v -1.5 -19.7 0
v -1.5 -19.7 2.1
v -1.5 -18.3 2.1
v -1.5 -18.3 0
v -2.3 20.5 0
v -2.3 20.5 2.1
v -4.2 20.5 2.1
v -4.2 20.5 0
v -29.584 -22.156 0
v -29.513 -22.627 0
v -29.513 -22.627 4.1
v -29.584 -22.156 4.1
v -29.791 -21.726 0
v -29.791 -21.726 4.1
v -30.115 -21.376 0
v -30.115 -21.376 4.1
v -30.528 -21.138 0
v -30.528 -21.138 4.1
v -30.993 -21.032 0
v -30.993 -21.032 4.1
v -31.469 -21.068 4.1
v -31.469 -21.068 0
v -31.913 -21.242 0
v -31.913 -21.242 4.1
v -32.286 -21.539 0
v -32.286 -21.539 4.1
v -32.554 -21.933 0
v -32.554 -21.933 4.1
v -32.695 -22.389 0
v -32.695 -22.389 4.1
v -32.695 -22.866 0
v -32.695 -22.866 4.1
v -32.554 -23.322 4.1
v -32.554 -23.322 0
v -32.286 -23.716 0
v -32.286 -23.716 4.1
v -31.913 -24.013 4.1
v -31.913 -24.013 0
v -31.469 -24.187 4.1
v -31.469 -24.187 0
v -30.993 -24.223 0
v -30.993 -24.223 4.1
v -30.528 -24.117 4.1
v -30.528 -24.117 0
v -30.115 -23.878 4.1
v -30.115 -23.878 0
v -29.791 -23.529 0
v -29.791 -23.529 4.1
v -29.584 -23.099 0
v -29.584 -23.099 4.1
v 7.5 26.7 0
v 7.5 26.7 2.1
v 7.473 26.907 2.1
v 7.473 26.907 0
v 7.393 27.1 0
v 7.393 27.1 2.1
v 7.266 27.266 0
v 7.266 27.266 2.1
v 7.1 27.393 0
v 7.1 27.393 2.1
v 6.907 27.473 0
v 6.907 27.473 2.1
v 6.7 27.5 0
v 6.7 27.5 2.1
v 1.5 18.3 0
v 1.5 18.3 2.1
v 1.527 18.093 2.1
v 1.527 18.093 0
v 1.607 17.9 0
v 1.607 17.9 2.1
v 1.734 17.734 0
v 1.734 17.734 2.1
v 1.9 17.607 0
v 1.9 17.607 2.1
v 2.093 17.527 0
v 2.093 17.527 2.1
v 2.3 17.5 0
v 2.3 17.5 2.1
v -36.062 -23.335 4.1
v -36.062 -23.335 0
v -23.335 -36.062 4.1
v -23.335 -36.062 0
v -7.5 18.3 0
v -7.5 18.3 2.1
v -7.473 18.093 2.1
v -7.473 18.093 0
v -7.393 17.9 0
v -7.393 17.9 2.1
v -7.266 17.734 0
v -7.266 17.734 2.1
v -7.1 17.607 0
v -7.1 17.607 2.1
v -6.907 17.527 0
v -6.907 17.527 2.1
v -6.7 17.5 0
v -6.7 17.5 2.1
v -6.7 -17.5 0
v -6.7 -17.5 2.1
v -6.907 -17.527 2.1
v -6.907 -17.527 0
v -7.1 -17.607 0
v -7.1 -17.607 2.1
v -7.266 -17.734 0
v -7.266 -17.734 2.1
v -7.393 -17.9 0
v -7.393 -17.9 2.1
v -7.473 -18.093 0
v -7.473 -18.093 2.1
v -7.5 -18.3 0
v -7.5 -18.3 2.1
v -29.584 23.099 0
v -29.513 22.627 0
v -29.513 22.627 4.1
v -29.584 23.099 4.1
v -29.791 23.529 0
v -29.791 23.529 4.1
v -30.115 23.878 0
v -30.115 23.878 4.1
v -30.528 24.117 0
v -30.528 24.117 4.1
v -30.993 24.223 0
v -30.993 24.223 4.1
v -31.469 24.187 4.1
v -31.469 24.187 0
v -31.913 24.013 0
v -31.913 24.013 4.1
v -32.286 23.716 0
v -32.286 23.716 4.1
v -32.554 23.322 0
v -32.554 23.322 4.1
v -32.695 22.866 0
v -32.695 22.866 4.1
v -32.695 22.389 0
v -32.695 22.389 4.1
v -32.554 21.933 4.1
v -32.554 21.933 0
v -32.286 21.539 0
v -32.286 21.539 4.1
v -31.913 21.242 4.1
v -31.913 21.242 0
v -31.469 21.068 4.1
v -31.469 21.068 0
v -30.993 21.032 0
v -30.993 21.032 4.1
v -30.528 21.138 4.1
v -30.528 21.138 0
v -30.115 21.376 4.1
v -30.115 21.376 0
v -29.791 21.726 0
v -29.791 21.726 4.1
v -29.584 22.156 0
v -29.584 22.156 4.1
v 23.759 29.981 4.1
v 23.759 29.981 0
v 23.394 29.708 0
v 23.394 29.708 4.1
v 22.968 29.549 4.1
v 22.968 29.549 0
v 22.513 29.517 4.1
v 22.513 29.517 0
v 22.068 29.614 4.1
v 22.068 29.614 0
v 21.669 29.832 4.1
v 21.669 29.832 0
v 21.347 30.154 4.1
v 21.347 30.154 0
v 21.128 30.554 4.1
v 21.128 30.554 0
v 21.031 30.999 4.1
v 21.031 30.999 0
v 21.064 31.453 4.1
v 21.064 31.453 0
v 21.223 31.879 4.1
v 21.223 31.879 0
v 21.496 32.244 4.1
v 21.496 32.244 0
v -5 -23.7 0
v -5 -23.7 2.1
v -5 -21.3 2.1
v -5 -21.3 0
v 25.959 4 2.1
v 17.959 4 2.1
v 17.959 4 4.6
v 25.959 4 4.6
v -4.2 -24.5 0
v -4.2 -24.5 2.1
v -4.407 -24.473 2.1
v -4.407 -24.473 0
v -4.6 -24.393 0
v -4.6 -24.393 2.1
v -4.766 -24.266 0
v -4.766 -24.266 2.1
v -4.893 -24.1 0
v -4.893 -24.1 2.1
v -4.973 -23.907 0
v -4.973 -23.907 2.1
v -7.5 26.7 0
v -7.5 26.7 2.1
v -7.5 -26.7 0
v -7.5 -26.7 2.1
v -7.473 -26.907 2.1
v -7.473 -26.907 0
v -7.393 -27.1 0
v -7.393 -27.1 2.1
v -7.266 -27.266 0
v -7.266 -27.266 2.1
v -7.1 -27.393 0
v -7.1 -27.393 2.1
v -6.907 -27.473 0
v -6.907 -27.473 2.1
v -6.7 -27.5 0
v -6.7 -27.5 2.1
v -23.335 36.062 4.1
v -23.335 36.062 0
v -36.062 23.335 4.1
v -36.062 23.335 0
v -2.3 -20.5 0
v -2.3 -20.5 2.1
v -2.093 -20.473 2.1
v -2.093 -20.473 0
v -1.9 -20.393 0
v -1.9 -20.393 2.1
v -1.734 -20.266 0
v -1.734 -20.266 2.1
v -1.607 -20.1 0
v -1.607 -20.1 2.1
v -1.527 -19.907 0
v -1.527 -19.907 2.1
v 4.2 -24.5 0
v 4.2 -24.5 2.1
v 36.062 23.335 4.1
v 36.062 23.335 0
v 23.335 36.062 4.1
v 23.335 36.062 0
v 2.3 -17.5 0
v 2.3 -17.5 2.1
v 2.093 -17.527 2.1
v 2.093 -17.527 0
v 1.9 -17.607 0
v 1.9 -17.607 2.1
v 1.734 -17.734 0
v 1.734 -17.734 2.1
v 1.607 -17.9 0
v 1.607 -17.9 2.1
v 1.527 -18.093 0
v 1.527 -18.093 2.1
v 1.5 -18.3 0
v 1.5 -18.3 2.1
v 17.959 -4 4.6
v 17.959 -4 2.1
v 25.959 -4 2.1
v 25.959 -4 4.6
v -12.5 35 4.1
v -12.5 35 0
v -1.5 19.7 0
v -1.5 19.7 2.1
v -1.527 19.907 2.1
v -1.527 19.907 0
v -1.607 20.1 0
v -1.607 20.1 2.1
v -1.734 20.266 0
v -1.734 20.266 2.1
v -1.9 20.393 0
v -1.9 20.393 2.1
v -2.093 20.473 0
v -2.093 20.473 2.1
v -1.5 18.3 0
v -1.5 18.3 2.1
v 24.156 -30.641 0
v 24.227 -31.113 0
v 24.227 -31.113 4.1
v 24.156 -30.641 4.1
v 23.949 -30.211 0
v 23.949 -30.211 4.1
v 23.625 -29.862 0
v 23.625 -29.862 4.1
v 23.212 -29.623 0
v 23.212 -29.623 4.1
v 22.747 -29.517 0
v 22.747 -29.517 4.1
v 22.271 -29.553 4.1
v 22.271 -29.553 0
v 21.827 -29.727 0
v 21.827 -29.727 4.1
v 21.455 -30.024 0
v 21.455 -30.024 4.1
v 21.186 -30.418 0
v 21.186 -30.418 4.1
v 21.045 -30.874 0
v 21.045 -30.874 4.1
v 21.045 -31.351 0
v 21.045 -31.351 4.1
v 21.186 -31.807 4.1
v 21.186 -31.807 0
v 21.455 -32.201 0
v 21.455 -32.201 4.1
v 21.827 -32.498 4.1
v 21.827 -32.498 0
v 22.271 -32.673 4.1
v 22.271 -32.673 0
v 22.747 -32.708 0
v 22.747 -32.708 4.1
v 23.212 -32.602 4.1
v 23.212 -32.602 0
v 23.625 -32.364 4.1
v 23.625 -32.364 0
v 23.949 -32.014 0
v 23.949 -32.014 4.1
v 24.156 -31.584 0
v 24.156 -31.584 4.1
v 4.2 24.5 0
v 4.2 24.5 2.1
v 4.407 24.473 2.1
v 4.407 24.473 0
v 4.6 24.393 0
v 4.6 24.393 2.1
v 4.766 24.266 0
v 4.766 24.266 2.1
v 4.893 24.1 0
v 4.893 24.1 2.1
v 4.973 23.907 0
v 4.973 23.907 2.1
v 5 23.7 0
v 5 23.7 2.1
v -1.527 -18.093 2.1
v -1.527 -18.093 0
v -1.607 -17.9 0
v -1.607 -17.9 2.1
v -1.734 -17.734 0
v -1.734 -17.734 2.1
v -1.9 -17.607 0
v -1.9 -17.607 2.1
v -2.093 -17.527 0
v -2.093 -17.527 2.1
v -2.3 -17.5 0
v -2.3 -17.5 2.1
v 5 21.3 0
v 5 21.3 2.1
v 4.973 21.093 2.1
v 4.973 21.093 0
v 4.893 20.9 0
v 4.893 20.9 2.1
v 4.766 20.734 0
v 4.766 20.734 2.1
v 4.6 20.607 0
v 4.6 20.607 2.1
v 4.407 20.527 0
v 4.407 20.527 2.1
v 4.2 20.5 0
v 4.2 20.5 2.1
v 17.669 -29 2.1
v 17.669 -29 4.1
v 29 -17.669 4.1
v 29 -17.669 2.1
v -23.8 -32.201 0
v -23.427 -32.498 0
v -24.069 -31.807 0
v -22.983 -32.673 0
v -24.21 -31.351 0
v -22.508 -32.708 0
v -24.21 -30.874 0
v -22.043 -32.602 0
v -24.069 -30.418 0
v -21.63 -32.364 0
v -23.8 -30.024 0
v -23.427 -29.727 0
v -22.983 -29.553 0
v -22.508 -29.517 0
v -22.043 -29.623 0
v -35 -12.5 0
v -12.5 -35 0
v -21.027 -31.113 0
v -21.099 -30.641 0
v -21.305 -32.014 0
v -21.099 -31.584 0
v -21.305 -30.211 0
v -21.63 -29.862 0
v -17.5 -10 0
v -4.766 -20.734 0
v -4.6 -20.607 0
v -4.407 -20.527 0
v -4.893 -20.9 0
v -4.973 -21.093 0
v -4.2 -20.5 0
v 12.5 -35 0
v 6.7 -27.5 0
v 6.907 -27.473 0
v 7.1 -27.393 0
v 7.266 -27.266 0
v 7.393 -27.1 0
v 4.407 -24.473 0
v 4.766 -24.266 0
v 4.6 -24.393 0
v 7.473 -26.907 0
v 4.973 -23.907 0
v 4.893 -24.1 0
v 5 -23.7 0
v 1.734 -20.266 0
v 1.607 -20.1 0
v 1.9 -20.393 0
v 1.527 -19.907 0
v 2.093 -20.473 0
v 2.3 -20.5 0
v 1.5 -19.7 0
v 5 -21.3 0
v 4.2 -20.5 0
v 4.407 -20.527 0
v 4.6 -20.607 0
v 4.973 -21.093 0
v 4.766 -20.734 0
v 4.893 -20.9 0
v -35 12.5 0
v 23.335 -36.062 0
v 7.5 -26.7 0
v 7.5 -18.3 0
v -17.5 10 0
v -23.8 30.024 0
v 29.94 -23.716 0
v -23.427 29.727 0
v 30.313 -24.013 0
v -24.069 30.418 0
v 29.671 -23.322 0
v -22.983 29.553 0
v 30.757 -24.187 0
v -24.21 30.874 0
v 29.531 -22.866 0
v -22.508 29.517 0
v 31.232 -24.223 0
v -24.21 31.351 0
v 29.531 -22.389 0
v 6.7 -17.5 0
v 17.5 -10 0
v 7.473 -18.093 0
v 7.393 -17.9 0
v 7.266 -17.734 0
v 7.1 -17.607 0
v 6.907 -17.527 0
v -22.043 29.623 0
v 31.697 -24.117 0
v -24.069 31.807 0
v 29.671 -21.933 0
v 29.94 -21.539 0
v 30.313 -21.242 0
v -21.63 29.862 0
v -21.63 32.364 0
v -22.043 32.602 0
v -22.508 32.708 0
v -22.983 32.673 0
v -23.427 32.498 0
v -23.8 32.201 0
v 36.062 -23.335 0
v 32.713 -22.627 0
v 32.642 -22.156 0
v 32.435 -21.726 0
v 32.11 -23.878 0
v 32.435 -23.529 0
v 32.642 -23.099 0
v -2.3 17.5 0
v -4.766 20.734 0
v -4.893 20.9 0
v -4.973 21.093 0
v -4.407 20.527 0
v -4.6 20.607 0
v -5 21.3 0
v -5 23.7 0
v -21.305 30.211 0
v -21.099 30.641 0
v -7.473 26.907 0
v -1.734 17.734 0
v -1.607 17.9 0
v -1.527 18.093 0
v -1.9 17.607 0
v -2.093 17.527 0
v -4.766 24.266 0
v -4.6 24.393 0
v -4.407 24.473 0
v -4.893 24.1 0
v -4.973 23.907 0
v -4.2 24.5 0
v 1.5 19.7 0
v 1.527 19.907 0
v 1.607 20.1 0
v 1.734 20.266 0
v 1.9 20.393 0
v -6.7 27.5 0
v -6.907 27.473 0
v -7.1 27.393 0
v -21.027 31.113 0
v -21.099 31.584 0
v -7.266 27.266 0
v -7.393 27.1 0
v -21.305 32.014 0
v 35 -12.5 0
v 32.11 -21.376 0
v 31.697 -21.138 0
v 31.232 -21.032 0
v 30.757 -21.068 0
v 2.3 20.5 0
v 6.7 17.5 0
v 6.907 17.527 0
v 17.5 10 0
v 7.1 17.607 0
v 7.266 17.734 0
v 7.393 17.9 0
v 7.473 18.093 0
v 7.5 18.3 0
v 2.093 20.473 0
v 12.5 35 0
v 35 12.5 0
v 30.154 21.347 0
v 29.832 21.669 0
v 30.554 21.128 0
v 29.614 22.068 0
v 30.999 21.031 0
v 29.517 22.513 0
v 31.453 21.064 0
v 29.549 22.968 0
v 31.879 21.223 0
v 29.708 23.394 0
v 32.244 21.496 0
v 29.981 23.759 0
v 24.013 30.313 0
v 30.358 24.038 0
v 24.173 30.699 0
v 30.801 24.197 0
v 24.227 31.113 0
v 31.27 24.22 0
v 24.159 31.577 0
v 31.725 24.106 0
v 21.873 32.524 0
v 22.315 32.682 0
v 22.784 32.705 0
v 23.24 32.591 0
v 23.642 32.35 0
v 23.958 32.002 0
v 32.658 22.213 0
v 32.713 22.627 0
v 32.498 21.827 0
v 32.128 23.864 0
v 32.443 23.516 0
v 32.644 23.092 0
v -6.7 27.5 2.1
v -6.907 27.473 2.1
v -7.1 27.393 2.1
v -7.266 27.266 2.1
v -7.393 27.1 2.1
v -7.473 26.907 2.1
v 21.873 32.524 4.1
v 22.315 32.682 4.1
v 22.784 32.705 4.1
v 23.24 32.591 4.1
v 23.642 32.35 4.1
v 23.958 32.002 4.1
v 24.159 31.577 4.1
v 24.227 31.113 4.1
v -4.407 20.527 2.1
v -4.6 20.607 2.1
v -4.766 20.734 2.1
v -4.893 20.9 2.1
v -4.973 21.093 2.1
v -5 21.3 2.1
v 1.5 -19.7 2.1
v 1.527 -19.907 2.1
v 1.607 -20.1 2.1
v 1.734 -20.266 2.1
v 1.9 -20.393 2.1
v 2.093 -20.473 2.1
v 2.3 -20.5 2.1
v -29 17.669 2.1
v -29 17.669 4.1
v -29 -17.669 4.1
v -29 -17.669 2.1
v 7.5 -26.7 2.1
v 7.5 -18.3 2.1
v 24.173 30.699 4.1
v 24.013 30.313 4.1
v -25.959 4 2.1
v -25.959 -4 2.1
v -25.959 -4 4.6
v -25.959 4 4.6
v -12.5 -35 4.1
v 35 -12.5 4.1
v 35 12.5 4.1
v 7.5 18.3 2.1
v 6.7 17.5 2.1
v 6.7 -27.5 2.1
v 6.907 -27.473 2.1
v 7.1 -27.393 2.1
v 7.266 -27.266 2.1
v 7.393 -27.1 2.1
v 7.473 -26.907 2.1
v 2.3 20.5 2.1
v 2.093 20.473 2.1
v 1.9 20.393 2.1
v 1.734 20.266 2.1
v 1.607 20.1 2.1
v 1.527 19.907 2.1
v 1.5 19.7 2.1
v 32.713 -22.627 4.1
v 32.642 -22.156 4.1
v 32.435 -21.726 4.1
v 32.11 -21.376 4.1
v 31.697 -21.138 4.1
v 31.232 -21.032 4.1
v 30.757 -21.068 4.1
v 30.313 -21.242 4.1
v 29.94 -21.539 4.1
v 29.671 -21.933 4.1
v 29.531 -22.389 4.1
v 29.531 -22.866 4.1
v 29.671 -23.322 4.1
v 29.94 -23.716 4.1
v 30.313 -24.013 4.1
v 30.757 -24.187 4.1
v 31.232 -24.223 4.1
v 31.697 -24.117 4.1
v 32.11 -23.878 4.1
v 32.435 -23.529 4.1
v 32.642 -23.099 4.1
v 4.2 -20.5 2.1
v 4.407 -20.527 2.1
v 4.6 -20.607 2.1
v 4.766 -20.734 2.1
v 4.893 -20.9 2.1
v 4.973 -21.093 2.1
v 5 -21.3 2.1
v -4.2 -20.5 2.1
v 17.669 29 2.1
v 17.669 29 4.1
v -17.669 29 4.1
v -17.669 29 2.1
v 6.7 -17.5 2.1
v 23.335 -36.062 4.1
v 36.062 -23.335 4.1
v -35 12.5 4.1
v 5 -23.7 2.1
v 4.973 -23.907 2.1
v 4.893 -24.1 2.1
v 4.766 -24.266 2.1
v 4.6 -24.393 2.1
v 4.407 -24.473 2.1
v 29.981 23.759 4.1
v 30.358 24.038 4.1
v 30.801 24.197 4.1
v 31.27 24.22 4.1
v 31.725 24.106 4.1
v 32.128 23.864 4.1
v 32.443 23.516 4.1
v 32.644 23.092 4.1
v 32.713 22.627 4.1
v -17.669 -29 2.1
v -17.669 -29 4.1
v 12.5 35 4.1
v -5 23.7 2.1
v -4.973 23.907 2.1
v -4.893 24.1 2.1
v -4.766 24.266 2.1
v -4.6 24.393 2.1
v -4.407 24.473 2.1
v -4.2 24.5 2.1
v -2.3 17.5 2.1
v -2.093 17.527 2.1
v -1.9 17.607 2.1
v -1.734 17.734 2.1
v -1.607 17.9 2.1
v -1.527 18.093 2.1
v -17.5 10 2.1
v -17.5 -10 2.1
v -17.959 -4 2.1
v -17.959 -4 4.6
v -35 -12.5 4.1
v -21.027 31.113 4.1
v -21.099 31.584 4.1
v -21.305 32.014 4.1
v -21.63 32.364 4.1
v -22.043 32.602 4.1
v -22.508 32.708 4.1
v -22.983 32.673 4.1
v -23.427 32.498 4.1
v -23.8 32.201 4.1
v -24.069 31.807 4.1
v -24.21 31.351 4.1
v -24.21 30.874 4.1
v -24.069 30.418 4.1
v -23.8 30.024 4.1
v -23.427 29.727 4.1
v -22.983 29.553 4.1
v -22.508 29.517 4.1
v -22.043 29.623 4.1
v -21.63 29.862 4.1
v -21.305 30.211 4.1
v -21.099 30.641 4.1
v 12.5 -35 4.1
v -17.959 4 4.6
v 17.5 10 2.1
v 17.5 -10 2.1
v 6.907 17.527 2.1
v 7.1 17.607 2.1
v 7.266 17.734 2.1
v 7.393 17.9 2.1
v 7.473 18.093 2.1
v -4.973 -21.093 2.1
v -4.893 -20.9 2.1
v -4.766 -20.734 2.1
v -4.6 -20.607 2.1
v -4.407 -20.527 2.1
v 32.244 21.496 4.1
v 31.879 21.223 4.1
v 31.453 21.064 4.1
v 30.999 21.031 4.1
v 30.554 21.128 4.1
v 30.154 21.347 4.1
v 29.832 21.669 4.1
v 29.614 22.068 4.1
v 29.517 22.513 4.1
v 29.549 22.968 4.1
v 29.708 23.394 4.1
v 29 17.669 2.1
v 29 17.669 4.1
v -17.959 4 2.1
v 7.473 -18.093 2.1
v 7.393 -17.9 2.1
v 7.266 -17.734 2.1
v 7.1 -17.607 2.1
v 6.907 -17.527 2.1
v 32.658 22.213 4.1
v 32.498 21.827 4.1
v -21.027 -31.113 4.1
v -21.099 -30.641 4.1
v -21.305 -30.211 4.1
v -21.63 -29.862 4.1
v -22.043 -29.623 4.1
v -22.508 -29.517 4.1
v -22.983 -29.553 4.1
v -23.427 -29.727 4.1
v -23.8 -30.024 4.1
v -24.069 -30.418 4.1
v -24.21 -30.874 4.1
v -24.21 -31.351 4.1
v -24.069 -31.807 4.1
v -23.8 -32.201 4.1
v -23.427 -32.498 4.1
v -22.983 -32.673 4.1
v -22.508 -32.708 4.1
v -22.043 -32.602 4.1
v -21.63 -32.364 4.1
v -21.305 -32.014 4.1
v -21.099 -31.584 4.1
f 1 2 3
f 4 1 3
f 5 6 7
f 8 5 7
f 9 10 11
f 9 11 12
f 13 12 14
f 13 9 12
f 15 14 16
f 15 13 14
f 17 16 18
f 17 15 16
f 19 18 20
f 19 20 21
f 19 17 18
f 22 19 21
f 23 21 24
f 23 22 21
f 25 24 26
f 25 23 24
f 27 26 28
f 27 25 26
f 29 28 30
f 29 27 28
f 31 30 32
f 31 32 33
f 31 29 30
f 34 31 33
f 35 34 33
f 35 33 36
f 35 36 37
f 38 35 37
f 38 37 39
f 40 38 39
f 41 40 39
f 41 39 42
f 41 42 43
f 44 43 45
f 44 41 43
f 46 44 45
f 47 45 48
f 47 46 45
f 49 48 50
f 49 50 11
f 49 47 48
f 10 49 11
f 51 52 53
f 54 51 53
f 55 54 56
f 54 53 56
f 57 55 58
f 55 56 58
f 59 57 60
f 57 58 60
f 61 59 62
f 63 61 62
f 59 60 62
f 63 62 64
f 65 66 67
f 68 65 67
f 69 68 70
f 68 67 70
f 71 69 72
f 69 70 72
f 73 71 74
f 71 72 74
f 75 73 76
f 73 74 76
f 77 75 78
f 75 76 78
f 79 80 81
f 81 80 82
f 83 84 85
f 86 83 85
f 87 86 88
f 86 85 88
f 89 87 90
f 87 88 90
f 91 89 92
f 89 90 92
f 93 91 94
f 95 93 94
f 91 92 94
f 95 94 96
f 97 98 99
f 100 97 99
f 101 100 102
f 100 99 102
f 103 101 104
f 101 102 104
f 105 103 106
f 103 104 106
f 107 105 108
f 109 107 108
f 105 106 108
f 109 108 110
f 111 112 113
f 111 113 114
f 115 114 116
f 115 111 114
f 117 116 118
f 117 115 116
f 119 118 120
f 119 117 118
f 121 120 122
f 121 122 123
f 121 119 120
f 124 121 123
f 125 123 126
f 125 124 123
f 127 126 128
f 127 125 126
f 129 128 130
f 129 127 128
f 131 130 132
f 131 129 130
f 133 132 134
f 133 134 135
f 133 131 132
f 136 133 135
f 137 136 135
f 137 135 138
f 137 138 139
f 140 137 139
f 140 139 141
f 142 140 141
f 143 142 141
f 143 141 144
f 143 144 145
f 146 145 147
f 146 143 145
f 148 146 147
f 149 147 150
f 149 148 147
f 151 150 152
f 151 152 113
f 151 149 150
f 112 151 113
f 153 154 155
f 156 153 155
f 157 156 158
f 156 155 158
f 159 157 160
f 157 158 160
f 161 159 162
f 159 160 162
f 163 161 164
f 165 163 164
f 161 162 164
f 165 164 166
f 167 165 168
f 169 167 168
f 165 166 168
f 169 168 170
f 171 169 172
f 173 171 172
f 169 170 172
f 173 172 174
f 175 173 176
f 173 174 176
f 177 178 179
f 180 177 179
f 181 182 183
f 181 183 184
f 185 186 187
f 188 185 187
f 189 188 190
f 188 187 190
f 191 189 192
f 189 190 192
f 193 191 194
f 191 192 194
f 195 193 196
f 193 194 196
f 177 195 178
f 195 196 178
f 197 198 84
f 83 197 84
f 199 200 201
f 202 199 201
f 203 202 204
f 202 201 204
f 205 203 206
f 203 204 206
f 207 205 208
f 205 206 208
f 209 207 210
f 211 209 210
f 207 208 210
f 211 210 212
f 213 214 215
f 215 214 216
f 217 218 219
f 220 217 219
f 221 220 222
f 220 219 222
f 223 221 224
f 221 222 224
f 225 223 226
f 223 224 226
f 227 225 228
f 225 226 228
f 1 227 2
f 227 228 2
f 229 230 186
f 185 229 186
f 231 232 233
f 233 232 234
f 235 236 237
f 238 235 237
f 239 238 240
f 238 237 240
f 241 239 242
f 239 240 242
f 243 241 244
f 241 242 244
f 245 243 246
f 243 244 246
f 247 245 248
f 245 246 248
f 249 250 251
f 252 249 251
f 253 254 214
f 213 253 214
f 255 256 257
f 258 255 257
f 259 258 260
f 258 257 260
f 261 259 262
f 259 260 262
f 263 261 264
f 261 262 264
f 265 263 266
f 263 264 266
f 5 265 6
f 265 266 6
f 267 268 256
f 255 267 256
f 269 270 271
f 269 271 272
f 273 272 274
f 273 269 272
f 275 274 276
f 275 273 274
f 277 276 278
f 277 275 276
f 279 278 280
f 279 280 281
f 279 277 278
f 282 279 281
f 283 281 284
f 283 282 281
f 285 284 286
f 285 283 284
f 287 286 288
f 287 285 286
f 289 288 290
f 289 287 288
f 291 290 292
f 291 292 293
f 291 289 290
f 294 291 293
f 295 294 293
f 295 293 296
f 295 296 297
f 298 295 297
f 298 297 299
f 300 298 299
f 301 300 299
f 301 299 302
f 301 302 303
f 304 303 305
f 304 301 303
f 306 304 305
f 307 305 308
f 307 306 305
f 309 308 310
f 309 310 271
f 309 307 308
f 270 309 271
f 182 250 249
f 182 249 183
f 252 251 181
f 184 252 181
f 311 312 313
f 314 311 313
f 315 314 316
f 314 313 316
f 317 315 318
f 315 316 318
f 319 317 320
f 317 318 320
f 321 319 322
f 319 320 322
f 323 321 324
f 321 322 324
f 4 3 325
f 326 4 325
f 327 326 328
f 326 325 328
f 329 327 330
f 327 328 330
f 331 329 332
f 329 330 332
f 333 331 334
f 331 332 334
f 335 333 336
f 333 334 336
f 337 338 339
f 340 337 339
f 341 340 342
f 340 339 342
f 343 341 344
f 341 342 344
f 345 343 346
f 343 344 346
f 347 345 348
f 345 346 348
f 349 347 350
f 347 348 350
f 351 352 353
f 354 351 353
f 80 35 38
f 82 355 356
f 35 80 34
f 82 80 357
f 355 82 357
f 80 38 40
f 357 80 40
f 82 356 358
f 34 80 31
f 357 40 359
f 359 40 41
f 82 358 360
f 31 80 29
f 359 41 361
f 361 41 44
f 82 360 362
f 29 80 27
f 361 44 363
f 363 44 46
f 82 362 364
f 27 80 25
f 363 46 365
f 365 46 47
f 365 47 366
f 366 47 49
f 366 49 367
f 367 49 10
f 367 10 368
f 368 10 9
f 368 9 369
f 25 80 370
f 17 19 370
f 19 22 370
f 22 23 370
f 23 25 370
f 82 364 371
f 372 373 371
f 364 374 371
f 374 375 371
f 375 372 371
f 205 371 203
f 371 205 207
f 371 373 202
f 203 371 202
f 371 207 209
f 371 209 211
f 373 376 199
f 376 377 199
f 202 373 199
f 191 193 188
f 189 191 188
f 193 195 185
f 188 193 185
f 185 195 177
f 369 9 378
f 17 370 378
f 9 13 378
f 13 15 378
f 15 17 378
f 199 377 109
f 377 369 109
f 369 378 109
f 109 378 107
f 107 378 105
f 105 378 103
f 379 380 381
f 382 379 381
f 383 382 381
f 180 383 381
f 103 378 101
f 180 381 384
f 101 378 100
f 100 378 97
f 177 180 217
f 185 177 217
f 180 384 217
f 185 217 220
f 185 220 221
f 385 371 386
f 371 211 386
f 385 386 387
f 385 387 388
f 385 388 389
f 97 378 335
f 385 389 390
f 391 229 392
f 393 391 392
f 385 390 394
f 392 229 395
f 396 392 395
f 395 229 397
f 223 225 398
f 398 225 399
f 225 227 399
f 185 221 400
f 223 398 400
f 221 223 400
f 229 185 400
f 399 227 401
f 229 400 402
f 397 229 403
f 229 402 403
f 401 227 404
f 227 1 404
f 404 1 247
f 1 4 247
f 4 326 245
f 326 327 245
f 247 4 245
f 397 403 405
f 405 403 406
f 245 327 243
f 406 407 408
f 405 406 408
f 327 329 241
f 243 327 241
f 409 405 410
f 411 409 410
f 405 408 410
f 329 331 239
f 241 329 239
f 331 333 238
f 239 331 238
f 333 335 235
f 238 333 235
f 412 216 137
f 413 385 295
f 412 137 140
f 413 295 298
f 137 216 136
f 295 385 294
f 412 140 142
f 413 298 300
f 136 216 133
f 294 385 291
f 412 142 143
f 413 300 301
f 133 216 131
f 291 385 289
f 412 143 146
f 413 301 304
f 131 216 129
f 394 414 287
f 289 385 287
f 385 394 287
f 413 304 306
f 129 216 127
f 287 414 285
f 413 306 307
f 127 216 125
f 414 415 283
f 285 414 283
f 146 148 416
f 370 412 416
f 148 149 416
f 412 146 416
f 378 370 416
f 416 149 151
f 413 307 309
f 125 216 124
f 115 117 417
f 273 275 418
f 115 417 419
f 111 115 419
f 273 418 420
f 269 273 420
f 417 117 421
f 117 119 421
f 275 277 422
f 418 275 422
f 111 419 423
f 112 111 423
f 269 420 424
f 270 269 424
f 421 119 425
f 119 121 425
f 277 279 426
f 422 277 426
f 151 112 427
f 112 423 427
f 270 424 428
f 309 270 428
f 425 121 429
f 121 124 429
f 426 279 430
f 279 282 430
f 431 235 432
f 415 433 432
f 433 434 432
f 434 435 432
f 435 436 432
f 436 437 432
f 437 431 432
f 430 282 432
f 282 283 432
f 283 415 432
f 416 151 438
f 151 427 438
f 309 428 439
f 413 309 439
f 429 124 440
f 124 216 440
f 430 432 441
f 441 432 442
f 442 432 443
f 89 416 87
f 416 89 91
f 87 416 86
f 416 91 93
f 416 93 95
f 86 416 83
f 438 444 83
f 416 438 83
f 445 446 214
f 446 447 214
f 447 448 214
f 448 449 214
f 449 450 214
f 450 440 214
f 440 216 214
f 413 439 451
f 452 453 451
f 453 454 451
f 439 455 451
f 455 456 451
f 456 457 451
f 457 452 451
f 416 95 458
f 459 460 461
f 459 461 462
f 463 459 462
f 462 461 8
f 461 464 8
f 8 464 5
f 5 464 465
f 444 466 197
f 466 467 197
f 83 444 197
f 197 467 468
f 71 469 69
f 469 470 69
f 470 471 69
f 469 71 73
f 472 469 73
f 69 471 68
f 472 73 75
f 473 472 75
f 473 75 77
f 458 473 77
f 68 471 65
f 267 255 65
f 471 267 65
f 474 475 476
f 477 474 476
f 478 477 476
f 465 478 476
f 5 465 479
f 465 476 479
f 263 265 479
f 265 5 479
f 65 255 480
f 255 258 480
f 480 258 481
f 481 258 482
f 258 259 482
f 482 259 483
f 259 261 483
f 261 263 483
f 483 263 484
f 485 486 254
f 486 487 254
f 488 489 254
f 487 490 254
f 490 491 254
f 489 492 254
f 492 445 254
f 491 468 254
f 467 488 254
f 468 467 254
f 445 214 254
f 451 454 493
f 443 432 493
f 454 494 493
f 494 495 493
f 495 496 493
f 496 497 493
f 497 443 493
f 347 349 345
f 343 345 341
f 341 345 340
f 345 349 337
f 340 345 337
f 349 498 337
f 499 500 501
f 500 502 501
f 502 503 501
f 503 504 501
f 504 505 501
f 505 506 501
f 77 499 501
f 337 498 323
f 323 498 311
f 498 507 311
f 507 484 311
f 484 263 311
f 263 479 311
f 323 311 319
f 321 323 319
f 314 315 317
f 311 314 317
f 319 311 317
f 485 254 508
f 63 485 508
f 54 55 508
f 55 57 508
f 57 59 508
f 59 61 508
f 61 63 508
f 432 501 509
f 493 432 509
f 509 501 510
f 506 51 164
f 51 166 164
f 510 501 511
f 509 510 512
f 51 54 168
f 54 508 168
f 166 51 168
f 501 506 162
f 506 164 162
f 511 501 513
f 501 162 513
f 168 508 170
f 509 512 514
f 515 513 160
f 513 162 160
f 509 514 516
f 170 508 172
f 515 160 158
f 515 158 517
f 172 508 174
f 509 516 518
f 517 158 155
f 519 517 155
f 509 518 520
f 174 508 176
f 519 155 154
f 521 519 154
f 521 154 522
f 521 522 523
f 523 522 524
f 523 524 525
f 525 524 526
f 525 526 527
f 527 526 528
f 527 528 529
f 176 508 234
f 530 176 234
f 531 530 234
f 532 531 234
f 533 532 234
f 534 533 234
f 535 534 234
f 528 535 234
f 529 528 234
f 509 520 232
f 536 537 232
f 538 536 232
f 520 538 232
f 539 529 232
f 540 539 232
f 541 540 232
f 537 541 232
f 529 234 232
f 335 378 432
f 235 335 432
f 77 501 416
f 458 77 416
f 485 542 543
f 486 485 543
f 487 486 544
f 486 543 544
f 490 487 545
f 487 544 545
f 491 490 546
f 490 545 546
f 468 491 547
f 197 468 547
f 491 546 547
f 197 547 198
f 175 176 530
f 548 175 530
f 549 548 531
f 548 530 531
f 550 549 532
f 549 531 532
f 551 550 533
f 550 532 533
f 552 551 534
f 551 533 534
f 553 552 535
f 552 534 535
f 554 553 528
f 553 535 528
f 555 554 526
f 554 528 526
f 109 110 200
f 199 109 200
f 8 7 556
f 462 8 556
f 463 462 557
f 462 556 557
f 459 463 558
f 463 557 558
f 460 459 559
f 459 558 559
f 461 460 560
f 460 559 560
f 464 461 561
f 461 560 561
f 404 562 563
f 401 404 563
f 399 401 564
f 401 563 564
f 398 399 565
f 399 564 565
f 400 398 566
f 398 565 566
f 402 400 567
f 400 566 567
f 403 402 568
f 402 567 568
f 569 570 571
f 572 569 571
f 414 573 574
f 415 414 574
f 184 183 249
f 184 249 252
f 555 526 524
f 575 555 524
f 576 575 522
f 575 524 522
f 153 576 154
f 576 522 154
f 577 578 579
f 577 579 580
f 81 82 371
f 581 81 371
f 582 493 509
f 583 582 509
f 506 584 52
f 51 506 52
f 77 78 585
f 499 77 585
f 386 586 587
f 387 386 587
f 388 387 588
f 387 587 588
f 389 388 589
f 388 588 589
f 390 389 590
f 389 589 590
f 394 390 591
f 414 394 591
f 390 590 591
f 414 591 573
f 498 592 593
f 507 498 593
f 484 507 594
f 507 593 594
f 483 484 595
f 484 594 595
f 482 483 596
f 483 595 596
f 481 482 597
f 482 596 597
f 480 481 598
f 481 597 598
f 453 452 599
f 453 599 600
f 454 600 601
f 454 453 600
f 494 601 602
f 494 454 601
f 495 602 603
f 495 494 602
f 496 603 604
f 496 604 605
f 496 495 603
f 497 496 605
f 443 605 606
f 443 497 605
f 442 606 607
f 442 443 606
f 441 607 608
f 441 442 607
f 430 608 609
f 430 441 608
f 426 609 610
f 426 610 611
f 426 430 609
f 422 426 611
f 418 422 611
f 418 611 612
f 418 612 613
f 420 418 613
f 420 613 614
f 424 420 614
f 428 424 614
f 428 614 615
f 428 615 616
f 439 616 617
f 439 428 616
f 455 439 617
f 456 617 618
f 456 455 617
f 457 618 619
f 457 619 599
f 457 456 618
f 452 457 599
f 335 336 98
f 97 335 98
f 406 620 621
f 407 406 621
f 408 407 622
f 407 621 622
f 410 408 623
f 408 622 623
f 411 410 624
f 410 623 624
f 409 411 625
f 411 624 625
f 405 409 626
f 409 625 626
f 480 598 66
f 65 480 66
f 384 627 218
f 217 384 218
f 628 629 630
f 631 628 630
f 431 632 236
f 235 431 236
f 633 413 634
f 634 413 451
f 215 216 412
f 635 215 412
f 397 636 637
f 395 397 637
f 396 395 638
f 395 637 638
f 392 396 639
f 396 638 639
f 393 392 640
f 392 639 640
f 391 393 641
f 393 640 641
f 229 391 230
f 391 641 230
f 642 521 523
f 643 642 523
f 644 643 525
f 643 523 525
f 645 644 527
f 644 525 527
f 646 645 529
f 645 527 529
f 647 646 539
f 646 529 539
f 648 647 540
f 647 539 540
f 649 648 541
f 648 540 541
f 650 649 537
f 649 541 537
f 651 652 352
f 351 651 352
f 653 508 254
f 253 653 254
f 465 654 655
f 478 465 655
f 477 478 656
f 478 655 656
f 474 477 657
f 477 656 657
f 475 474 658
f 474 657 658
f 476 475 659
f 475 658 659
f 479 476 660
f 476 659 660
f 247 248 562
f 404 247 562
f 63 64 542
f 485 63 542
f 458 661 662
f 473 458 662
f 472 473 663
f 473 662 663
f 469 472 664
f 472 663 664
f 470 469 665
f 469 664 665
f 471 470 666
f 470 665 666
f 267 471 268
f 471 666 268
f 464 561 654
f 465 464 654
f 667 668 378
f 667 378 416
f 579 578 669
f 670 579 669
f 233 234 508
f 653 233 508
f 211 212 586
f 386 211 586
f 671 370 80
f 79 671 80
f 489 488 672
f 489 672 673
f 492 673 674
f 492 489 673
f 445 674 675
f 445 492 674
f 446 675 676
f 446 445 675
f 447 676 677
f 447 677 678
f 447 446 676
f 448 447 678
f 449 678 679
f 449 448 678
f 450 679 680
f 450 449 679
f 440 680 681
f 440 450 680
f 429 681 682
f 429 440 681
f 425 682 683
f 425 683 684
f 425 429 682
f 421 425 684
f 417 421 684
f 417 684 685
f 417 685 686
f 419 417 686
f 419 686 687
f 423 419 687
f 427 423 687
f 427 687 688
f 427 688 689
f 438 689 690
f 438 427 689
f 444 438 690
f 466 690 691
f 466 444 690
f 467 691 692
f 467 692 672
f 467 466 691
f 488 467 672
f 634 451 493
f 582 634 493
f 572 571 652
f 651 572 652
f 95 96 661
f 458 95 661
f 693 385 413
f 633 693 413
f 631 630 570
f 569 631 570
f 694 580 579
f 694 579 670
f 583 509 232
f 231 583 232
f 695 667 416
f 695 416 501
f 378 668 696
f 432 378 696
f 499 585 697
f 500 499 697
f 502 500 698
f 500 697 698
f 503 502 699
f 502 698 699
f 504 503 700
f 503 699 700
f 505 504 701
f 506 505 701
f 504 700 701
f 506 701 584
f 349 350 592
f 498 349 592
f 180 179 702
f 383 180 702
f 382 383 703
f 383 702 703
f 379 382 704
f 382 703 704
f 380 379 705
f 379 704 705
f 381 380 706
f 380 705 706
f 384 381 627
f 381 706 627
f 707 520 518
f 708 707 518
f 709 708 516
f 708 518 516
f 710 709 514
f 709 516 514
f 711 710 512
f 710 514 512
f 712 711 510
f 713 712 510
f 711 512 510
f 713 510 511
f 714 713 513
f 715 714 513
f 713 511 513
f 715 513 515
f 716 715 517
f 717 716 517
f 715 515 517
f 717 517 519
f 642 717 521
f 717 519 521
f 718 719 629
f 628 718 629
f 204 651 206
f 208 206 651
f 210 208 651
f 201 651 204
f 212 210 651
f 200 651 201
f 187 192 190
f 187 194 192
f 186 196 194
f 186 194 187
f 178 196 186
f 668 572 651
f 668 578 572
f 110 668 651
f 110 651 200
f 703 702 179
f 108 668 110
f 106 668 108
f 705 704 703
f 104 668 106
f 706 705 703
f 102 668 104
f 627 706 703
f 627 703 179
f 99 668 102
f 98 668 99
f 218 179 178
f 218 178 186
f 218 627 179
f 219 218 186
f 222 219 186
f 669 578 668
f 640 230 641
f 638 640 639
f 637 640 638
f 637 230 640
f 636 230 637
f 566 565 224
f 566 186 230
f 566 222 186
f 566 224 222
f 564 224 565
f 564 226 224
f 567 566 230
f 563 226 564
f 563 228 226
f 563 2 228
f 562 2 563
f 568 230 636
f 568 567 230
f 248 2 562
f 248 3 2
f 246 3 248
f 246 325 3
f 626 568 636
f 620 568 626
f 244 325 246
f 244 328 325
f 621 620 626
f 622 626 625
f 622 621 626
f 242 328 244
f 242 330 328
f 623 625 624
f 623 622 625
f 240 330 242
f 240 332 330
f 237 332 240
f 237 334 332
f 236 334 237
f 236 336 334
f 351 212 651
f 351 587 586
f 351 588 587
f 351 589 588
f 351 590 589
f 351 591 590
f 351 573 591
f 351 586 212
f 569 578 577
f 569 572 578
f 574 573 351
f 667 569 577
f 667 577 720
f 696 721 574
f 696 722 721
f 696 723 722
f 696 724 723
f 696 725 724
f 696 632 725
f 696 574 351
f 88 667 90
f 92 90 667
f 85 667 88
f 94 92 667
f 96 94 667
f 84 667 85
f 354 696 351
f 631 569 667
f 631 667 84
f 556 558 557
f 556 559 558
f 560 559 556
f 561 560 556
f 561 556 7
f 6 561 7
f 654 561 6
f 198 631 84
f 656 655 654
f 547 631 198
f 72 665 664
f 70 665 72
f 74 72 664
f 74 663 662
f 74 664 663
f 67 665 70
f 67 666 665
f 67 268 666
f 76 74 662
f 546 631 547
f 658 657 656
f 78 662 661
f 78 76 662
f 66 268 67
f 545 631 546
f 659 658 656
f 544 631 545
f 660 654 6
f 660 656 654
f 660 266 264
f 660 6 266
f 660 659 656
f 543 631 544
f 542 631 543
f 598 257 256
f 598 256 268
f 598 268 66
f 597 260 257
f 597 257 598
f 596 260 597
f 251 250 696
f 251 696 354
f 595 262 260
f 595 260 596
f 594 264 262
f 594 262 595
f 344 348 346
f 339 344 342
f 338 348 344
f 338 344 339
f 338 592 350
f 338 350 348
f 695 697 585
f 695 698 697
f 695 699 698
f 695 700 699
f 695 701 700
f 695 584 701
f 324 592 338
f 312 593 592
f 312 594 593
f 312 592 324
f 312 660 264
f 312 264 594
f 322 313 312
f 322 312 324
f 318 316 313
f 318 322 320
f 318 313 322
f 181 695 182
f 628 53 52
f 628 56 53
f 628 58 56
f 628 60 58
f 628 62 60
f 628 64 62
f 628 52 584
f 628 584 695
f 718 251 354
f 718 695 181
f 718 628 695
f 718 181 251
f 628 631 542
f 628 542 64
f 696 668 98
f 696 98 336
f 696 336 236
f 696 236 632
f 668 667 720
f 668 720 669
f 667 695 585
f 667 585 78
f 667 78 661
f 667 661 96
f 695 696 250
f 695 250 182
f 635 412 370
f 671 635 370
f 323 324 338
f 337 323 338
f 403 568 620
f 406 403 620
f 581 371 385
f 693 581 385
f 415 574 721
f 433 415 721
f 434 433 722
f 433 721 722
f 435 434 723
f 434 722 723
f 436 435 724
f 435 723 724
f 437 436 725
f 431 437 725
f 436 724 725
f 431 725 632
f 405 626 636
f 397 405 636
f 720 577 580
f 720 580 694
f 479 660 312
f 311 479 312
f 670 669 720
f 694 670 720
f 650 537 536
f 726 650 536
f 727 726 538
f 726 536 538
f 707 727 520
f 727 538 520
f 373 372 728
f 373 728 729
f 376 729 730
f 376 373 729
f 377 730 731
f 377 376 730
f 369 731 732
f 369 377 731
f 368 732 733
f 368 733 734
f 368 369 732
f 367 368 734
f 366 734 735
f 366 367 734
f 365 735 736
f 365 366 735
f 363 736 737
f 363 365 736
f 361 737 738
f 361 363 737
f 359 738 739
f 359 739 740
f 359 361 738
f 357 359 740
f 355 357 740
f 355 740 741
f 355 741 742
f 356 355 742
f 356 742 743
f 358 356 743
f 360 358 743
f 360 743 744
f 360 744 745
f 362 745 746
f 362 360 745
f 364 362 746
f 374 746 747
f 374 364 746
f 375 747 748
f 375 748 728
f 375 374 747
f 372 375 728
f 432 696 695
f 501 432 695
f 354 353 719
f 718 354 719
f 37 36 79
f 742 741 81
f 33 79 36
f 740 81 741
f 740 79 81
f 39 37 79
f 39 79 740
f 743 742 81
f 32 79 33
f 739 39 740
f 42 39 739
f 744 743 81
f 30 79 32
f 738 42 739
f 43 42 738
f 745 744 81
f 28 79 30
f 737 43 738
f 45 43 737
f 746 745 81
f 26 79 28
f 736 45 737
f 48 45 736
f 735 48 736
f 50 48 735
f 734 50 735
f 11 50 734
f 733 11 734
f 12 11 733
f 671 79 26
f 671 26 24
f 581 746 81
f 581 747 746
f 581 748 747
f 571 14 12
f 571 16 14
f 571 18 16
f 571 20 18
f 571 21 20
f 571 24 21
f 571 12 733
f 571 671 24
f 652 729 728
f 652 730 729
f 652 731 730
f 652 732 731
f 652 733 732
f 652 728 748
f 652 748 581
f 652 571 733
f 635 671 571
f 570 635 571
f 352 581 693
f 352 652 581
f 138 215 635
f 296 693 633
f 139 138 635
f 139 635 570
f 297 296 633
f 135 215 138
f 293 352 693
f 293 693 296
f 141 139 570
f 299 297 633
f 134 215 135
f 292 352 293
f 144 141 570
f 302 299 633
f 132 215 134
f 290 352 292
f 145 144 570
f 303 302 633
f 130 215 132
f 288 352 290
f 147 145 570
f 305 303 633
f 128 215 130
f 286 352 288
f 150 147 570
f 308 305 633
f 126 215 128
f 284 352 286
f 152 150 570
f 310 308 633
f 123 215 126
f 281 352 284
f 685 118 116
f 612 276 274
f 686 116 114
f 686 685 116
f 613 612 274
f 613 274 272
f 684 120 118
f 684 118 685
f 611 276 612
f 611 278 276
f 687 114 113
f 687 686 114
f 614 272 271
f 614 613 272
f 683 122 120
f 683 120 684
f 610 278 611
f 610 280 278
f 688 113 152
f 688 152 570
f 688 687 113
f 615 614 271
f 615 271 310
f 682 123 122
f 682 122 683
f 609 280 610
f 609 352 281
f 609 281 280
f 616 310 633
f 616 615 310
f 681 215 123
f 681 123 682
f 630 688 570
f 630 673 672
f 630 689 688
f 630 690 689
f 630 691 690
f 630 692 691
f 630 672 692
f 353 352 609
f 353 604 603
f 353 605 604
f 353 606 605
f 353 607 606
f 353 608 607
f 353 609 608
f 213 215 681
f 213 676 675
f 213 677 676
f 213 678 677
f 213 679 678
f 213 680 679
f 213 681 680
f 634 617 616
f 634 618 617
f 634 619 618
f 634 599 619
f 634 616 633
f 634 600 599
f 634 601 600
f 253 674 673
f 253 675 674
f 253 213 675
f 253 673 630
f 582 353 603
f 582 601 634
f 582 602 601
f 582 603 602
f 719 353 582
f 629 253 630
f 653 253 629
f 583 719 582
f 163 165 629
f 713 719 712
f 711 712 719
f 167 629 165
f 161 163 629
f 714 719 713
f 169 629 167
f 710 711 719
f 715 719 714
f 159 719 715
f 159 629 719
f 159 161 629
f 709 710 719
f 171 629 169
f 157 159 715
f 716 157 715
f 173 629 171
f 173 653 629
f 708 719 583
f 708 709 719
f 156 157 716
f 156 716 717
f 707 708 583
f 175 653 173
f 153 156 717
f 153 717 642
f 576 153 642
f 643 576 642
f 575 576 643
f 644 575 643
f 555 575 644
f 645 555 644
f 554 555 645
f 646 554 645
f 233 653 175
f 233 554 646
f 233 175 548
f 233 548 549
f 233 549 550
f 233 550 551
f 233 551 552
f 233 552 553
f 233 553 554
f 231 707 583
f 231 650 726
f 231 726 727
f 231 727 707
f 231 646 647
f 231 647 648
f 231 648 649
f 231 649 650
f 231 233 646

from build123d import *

# Parameters (mm, degrees)
F0_R     = 1.6
F1_DEPTH = 4.1
F3_DEPTH = 2
F5_DEPTH = 2.101
F6_W     = 35
F6_H     = 20
F7_DEPTH = 2.101
F8_W     = 8
F8_H     = 8
F9_DEPTH = 2.5


with BuildPart() as f1:
    # F0 (on Top) → F1 (new body)
    with BuildSketch(Plane.XY):
        Polygon((0, 35), (0, 0), (26.870058, 26.870058), (29.698485, 29.698485), (23.334524, 36.062446), (12.5, 35), align=None)
        with BuildLine():
            ThreePointArc((24.227417, 31.112698), (24.105624, 30.500405), (23.758788, 29.981328))
            ThreePointArc((23.758788, 29.981328), (21.496046, 29.981328), (21.496046, 32.244069))
            ThreePointArc((21.496046, 32.244069), (23.23971, 32.590906), (24.227417, 31.112698))
        make_face(mode=Mode.SUBTRACT)
        Polygon((0, -35), (0, 0), (0, 35), (-12.5, 35), (-23.334524, 36.062446), (-36.062446, 23.334524), (-35, 12.5), (-35, -12.5), (-36.062446, -23.334524), (-23.334524, -36.062446), (-12.5, -35), align=None)
        with Locations((-22.627417, -31.112698)):
            Circle(F0_R, mode=Mode.SUBTRACT)
        with Locations((-31.112698, -22.627417)):
            Circle(F0_R, mode=Mode.SUBTRACT)
        with Locations((-31.112698, 22.627417)):
            Circle(F0_R, mode=Mode.SUBTRACT)
        with Locations((-22.627417, 31.112698)):
            Circle(F0_R, mode=Mode.SUBTRACT)
        Polygon((26.870058, 26.870058), (0, 0), (0, -35), (12.5, -35), (23.334524, -36.062446), (36.062446, -23.334524), (35, -12.5), (35, 12.5), (36.062446, 23.334524), (29.698485, 29.698485), align=None)
        with Locations((22.627417, -31.112698)):
            Circle(F0_R, mode=Mode.SUBTRACT)
        with Locations((31.112698, -22.627417)):
            Circle(F0_R, mode=Mode.SUBTRACT)
        with BuildLine():
            ThreePointArc((32.244069, 21.496046), (29.981328, 21.496046), (29.981328, 23.758788))
            ThreePointArc((29.981328, 23.758788), (31.724992, 24.105624), (32.712698, 22.627417))
            ThreePointArc((32.712698, 22.627417), (32.590906, 22.015124), (32.244069, 21.496046))
        make_face(mode=Mode.SUBTRACT)
    extrude(amount=F1_DEPTH)

    # F2 (on face) → F3 (cut)
    with BuildSketch(Plane.XY.offset(4.1)):
        Polygon((-29, 17.669048), (-29, 0), (0, 0), (0, 29), (-17.669048, 29), align=None)
        Polygon((0, 0), (-29, 0), (-29, -17.669048), (-17.669048, -29), (17.669048, -29), (29, -17.669048), (29, 17.669045), (17.669045, 29), (0, 29), align=None)
    extrude(amount=-F3_DEPTH, mode=Mode.SUBTRACT)

    # F4 (on face) → F5 (cut, through all)
    with BuildSketch(Plane.XY.offset(2.1)):
        with BuildLine():
            Line((6.7, 27.5), (0, 27.5))
            Line((0, 27.5), (0, 24.5))
            Line((0, 24.5), (4.2, 24.5))
            ThreePointArc((4.2, 24.5), (4.765685, 24.265685), (5, 23.7))
            Line((5, 23.7), (5, 21.3))
            ThreePointArc((5, 21.3), (4.765685, 20.734315), (4.2, 20.5))
            Line((4.2, 20.5), (2.3, 20.5))
            ThreePointArc((2.3, 20.5), (1.734315, 20.265685), (1.5, 19.7))
            Line((1.5, 19.7), (1.5, 18.3))
            ThreePointArc((1.5, 18.3), (1.734315, 17.734315), (2.3, 17.5))
            Line((2.3, 17.5), (6.7, 17.5))
            ThreePointArc((6.7, 17.5), (7.265685, 17.734315), (7.5, 18.3))
            Line((7.5, 18.3), (7.5, 26.7))
            ThreePointArc((7.5, 26.7), (7.265685, 27.265685), (6.7, 27.5))
        make_face()
        with BuildLine():
            Line((0, 24.5), (0, 27.5))
            Line((0, 27.5), (-6.7, 27.5))
            ThreePointArc((-6.7, 27.5), (-7.265685, 27.265685), (-7.5, 26.7))
            Line((-7.5, 26.7), (-7.5, 18.3))
            ThreePointArc((-7.5, 18.3), (-7.265685, 17.734315), (-6.7, 17.5))
            Line((-6.7, 17.5), (-2.3, 17.5))
            ThreePointArc((-2.3, 17.5), (-1.734315, 17.734315), (-1.5, 18.3))
            Line((-1.5, 18.3), (-1.5, 19.7))
            ThreePointArc((-1.5, 19.7), (-1.734315, 20.265685), (-2.3, 20.5))
            Line((-2.3, 20.5), (-4.2, 20.5))
            ThreePointArc((-4.2, 20.5), (-4.765685, 20.734315), (-5, 21.3))
            Line((-5, 21.3), (-5, 23.7))
            ThreePointArc((-5, 23.7), (-4.765685, 24.265685), (-4.2, 24.5))
            Line((-4.2, 24.5), (0, 24.5))
        make_face()
        with BuildLine():
            Line((-4.2, -20.5), (-2.3, -20.5))
            ThreePointArc((-2.3, -20.5), (-1.734315, -20.265685), (-1.5, -19.7))
            Line((-1.5, -19.7), (-1.5, -18.3))
            ThreePointArc((-1.5, -18.3), (-1.734315, -17.734315), (-2.3, -17.5))
            Line((-2.3, -17.5), (-6.7, -17.5))
            ThreePointArc((-6.7, -17.5), (-7.265685, -17.734315), (-7.5, -18.3))
            Line((-7.5, -18.3), (-7.5, -26.7))
            ThreePointArc((-7.5, -26.7), (-7.265685, -27.265685), (-6.7, -27.5))
            Line((-6.7, -27.5), (6.7, -27.5))
            ThreePointArc((6.7, -27.5), (7.265685, -27.265685), (7.5, -26.7))
            Line((7.5, -26.7), (7.5, -18.3))
            ThreePointArc((7.5, -18.3), (7.265685, -17.734315), (6.7, -17.5))
            Line((6.7, -17.5), (2.3, -17.5))
            ThreePointArc((2.3, -17.5), (1.734315, -17.734315), (1.5, -18.3))
            Line((1.5, -18.3), (1.5, -19.7))
            ThreePointArc((1.5, -19.7), (1.734315, -20.265685), (2.3, -20.5))
            Line((2.3, -20.5), (4.2, -20.5))
            ThreePointArc((4.2, -20.5), (4.765685, -20.734315), (5, -21.3))
            Line((5, -21.3), (5, -23.7))
            ThreePointArc((5, -23.7), (4.765685, -24.265685), (4.2, -24.5))
            Line((4.2, -24.5), (-4.2, -24.5))
            ThreePointArc((-4.2, -24.5), (-4.765685, -24.265685), (-5, -23.7))
            Line((-5, -23.7), (-5, -21.3))
            ThreePointArc((-5, -21.3), (-4.765685, -20.734315), (-4.2, -20.5))
        make_face()
    extrude(amount=-F5_DEPTH, mode=Mode.SUBTRACT)

    # F6 (on face) → F7 (cut, through all)
    with BuildSketch(Plane.XY.offset(2.1)):
        Rectangle(F6_W, F6_H)
    extrude(amount=-F7_DEPTH, mode=Mode.SUBTRACT)

    # F8 (on face) → F9 (join)
    with BuildSketch(Plane.XY.offset(2.1)):
        with Locations((-21.959, 0)):
            Rectangle(F8_W, F8_H)
        with Locations((21.959, 0)):
            Rectangle(F8_W, F8_H)
    extrude(amount=F9_DEPTH)


solid = f1.part
